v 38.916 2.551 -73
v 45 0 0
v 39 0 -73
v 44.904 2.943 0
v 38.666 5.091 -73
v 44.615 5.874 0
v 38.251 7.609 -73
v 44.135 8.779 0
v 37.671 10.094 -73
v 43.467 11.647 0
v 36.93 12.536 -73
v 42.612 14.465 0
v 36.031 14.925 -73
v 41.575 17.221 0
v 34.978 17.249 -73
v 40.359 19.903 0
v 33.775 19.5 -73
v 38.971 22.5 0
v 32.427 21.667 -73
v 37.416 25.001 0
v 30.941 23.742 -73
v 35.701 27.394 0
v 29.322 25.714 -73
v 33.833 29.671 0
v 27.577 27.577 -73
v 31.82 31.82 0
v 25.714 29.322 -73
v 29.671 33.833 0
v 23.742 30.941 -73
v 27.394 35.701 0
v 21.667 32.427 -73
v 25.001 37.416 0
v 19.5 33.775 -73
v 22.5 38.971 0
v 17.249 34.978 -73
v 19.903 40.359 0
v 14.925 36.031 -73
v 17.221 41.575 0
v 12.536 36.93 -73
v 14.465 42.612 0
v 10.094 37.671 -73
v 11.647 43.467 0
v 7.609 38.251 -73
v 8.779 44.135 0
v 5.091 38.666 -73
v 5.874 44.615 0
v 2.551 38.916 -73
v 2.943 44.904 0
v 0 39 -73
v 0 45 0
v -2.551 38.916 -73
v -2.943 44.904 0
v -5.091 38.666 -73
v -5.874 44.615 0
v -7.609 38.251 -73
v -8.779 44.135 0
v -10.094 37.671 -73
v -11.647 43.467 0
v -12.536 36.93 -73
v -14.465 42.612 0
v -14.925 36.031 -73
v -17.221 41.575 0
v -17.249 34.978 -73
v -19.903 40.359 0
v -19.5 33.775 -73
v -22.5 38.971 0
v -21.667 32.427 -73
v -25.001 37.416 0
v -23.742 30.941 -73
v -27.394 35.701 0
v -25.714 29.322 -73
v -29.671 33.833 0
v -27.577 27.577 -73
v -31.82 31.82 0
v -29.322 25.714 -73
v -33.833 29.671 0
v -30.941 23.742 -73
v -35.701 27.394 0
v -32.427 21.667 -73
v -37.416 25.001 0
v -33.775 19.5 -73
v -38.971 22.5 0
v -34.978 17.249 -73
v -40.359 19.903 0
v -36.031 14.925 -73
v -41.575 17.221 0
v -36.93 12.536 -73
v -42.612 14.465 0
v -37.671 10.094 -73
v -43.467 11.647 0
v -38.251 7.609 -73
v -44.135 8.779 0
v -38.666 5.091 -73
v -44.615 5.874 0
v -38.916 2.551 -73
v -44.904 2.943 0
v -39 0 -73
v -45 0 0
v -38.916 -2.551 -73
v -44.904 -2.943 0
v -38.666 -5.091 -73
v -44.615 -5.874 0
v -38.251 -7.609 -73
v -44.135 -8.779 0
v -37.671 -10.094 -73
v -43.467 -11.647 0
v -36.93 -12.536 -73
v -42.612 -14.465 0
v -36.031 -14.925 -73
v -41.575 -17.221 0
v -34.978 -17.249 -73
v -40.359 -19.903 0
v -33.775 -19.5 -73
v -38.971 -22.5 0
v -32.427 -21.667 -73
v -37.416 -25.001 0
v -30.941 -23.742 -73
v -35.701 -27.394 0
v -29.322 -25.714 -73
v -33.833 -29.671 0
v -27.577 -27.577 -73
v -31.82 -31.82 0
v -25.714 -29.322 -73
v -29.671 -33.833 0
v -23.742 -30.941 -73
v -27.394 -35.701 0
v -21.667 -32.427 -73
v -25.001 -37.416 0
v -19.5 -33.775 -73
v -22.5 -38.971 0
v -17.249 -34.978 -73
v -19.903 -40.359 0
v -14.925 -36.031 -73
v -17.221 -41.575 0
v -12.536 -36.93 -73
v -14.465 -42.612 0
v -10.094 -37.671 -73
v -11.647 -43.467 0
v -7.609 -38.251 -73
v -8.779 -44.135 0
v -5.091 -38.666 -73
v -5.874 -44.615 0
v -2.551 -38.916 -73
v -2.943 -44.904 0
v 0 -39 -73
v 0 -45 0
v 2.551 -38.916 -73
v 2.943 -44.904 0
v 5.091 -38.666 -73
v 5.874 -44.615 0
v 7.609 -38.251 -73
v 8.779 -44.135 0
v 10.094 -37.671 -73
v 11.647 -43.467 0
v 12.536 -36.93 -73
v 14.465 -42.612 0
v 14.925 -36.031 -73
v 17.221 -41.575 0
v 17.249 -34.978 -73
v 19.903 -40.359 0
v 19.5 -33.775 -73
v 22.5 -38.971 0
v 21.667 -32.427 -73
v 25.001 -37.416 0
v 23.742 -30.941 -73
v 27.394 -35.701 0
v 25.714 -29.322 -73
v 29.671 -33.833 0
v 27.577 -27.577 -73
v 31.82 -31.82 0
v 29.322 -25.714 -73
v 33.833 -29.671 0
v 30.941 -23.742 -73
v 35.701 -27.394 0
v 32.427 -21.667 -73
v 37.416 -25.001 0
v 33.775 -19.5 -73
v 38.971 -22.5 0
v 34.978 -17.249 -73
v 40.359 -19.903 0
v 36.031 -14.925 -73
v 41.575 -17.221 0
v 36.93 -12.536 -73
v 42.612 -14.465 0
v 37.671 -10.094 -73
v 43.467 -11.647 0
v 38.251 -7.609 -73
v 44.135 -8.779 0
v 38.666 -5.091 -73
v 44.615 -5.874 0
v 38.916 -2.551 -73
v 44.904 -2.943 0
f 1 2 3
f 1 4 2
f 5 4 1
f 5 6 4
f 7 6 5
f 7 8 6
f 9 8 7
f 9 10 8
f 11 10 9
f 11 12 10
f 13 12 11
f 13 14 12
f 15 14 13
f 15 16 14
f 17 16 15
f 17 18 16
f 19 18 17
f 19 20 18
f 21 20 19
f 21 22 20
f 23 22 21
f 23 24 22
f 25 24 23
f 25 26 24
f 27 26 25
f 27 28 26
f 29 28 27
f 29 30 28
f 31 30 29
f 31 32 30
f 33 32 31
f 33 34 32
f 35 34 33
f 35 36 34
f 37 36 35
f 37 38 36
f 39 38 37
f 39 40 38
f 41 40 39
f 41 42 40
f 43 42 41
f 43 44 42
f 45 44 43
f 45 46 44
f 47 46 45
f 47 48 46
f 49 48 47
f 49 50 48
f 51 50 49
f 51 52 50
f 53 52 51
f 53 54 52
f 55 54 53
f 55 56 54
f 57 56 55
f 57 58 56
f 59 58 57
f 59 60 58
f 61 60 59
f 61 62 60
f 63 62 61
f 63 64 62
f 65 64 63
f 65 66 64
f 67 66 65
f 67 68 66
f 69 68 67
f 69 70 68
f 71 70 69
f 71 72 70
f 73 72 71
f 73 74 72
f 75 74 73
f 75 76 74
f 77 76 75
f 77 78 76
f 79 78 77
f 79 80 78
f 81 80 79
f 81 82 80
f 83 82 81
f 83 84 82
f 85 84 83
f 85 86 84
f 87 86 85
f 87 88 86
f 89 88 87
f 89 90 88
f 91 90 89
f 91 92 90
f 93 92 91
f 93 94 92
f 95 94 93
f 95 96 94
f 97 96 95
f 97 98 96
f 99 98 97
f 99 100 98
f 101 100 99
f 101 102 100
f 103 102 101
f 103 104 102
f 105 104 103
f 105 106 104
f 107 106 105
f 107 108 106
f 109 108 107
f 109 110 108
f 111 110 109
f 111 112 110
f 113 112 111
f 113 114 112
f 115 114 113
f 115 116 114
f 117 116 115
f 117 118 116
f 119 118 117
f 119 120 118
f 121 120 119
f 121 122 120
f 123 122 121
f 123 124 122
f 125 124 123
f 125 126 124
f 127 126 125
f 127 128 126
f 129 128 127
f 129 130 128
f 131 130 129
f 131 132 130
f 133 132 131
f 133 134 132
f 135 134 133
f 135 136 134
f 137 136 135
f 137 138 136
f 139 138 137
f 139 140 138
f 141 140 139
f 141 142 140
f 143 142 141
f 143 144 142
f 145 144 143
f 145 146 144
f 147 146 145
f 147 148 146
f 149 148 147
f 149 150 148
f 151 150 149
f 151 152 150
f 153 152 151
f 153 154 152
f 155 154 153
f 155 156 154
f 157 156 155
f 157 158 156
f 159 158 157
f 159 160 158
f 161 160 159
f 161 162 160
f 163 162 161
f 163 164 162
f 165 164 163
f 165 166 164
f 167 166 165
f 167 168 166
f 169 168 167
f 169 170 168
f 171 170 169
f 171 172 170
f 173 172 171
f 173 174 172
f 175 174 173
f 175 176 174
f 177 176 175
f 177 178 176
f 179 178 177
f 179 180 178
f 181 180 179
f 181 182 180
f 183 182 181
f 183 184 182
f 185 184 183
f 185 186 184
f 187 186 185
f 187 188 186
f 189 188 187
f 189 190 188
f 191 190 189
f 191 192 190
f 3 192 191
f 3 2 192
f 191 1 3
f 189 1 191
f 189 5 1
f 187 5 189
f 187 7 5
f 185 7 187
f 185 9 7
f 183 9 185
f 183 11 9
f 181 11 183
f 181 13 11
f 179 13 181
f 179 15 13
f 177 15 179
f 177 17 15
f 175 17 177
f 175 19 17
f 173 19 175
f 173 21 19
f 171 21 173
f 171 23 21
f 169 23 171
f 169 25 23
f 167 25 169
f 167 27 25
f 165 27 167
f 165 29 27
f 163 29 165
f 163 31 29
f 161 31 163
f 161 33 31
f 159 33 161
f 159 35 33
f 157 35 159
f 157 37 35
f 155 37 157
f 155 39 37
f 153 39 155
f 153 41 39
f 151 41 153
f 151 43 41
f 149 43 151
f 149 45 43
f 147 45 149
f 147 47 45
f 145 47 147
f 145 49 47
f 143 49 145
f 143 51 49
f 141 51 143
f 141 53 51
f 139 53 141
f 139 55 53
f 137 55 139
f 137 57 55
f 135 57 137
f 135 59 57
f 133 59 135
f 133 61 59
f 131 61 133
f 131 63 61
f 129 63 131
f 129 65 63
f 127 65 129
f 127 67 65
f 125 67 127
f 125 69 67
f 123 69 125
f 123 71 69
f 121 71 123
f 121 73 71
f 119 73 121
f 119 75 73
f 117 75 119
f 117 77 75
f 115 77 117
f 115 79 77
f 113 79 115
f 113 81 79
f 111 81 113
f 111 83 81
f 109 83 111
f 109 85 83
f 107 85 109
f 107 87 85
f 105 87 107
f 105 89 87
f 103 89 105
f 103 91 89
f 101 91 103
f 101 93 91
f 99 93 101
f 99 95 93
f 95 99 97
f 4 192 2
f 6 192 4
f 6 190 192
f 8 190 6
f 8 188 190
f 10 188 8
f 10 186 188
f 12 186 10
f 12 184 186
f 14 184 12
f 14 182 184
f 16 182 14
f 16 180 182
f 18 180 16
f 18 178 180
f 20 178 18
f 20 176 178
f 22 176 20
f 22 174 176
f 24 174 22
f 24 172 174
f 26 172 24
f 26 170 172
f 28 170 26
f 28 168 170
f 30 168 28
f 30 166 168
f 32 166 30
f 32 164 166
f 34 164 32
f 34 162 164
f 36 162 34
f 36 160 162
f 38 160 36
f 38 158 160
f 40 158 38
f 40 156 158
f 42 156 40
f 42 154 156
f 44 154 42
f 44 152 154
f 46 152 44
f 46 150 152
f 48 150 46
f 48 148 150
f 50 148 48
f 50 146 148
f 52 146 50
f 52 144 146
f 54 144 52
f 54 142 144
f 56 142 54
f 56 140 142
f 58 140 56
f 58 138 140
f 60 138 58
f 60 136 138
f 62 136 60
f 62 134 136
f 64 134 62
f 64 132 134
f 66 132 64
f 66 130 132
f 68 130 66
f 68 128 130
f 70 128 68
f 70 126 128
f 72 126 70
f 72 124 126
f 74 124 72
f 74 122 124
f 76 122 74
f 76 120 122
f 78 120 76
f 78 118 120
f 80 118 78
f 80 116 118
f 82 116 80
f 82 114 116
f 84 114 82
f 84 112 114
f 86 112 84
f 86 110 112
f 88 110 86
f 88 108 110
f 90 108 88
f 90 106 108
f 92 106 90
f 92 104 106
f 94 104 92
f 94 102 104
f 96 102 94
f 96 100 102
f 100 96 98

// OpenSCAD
// file: ../../lib/project/util.scad
// lib/project/util.scad

module rounded_rect_2d(size = [10, 10], r = 2) {
  x = size[0];
  y = size[1];
  rr = min(r, min(x, y) / 2);

  hull() {
    for (sx = [-1, 1], sy = [-1, 1]) {
      translate([sx * (x / 2 - rr), sy * (y / 2 - rr)])
        circle(r = rr);
    }
  }
}
// file: ../../lib/project/params.scad
// lib/project/params.scad
// Shared project parameters for the final tray and all fit-test models.

debug = false;

// Main tray footprint.
tray_corner_r = 15;

// Top tray shell.
tray_floor_t = 2.4;
tray_wall_h = 9;
top_wall_w = 10;

// Underside support lip and rear support section.
support_lip_drop = 10;
support_lip_w = 10;
console_clear_w = 320;
side_lip_run = 170;
tray_w = console_clear_w + 2 * support_lip_w;
tray_d = side_lip_run + support_lip_w;
rear_gap_w = 28;
rear_tongue_w = 170;
rear_tongue_depth = 34;
rear_tongue_t = 1.8;

// Cup holder location and plug geometry.
cup_spacing = 135;
cup_y_from_front = 72;
plug_top_d = 90;
plug_bottom_d = 78;
plug_h = 73;
plug_clearance_z = 0;
cup_rim_w = 7.5;
cup_rim_h = 5;

// Fit-test defaults.
test_plug_top_ds = [84, 85, 86];
test_spacing_values = [116, 118, 120];
test_lip_drop_values = [8, 10, 12];
test_rear_tongue_ts = [1.4, 1.8, 2.2];
test_frame_wall_w = 12;
test_front_zone_depth = 100;
test_rear_zone_depth = 56;
test_gap_section_w = 140;
test_coupon_spacing = 18;
// main file
use <../../lib/project/console_tray.scad>;
include <../../lib/project/params.scad>;

// Single plug test model.
plug_top_d_test = plug_top_d;

cup_holder_plug(
  top_d = plug_top_d_test,
  bottom_d = plug_bottom_d,
  h = plug_h
);
